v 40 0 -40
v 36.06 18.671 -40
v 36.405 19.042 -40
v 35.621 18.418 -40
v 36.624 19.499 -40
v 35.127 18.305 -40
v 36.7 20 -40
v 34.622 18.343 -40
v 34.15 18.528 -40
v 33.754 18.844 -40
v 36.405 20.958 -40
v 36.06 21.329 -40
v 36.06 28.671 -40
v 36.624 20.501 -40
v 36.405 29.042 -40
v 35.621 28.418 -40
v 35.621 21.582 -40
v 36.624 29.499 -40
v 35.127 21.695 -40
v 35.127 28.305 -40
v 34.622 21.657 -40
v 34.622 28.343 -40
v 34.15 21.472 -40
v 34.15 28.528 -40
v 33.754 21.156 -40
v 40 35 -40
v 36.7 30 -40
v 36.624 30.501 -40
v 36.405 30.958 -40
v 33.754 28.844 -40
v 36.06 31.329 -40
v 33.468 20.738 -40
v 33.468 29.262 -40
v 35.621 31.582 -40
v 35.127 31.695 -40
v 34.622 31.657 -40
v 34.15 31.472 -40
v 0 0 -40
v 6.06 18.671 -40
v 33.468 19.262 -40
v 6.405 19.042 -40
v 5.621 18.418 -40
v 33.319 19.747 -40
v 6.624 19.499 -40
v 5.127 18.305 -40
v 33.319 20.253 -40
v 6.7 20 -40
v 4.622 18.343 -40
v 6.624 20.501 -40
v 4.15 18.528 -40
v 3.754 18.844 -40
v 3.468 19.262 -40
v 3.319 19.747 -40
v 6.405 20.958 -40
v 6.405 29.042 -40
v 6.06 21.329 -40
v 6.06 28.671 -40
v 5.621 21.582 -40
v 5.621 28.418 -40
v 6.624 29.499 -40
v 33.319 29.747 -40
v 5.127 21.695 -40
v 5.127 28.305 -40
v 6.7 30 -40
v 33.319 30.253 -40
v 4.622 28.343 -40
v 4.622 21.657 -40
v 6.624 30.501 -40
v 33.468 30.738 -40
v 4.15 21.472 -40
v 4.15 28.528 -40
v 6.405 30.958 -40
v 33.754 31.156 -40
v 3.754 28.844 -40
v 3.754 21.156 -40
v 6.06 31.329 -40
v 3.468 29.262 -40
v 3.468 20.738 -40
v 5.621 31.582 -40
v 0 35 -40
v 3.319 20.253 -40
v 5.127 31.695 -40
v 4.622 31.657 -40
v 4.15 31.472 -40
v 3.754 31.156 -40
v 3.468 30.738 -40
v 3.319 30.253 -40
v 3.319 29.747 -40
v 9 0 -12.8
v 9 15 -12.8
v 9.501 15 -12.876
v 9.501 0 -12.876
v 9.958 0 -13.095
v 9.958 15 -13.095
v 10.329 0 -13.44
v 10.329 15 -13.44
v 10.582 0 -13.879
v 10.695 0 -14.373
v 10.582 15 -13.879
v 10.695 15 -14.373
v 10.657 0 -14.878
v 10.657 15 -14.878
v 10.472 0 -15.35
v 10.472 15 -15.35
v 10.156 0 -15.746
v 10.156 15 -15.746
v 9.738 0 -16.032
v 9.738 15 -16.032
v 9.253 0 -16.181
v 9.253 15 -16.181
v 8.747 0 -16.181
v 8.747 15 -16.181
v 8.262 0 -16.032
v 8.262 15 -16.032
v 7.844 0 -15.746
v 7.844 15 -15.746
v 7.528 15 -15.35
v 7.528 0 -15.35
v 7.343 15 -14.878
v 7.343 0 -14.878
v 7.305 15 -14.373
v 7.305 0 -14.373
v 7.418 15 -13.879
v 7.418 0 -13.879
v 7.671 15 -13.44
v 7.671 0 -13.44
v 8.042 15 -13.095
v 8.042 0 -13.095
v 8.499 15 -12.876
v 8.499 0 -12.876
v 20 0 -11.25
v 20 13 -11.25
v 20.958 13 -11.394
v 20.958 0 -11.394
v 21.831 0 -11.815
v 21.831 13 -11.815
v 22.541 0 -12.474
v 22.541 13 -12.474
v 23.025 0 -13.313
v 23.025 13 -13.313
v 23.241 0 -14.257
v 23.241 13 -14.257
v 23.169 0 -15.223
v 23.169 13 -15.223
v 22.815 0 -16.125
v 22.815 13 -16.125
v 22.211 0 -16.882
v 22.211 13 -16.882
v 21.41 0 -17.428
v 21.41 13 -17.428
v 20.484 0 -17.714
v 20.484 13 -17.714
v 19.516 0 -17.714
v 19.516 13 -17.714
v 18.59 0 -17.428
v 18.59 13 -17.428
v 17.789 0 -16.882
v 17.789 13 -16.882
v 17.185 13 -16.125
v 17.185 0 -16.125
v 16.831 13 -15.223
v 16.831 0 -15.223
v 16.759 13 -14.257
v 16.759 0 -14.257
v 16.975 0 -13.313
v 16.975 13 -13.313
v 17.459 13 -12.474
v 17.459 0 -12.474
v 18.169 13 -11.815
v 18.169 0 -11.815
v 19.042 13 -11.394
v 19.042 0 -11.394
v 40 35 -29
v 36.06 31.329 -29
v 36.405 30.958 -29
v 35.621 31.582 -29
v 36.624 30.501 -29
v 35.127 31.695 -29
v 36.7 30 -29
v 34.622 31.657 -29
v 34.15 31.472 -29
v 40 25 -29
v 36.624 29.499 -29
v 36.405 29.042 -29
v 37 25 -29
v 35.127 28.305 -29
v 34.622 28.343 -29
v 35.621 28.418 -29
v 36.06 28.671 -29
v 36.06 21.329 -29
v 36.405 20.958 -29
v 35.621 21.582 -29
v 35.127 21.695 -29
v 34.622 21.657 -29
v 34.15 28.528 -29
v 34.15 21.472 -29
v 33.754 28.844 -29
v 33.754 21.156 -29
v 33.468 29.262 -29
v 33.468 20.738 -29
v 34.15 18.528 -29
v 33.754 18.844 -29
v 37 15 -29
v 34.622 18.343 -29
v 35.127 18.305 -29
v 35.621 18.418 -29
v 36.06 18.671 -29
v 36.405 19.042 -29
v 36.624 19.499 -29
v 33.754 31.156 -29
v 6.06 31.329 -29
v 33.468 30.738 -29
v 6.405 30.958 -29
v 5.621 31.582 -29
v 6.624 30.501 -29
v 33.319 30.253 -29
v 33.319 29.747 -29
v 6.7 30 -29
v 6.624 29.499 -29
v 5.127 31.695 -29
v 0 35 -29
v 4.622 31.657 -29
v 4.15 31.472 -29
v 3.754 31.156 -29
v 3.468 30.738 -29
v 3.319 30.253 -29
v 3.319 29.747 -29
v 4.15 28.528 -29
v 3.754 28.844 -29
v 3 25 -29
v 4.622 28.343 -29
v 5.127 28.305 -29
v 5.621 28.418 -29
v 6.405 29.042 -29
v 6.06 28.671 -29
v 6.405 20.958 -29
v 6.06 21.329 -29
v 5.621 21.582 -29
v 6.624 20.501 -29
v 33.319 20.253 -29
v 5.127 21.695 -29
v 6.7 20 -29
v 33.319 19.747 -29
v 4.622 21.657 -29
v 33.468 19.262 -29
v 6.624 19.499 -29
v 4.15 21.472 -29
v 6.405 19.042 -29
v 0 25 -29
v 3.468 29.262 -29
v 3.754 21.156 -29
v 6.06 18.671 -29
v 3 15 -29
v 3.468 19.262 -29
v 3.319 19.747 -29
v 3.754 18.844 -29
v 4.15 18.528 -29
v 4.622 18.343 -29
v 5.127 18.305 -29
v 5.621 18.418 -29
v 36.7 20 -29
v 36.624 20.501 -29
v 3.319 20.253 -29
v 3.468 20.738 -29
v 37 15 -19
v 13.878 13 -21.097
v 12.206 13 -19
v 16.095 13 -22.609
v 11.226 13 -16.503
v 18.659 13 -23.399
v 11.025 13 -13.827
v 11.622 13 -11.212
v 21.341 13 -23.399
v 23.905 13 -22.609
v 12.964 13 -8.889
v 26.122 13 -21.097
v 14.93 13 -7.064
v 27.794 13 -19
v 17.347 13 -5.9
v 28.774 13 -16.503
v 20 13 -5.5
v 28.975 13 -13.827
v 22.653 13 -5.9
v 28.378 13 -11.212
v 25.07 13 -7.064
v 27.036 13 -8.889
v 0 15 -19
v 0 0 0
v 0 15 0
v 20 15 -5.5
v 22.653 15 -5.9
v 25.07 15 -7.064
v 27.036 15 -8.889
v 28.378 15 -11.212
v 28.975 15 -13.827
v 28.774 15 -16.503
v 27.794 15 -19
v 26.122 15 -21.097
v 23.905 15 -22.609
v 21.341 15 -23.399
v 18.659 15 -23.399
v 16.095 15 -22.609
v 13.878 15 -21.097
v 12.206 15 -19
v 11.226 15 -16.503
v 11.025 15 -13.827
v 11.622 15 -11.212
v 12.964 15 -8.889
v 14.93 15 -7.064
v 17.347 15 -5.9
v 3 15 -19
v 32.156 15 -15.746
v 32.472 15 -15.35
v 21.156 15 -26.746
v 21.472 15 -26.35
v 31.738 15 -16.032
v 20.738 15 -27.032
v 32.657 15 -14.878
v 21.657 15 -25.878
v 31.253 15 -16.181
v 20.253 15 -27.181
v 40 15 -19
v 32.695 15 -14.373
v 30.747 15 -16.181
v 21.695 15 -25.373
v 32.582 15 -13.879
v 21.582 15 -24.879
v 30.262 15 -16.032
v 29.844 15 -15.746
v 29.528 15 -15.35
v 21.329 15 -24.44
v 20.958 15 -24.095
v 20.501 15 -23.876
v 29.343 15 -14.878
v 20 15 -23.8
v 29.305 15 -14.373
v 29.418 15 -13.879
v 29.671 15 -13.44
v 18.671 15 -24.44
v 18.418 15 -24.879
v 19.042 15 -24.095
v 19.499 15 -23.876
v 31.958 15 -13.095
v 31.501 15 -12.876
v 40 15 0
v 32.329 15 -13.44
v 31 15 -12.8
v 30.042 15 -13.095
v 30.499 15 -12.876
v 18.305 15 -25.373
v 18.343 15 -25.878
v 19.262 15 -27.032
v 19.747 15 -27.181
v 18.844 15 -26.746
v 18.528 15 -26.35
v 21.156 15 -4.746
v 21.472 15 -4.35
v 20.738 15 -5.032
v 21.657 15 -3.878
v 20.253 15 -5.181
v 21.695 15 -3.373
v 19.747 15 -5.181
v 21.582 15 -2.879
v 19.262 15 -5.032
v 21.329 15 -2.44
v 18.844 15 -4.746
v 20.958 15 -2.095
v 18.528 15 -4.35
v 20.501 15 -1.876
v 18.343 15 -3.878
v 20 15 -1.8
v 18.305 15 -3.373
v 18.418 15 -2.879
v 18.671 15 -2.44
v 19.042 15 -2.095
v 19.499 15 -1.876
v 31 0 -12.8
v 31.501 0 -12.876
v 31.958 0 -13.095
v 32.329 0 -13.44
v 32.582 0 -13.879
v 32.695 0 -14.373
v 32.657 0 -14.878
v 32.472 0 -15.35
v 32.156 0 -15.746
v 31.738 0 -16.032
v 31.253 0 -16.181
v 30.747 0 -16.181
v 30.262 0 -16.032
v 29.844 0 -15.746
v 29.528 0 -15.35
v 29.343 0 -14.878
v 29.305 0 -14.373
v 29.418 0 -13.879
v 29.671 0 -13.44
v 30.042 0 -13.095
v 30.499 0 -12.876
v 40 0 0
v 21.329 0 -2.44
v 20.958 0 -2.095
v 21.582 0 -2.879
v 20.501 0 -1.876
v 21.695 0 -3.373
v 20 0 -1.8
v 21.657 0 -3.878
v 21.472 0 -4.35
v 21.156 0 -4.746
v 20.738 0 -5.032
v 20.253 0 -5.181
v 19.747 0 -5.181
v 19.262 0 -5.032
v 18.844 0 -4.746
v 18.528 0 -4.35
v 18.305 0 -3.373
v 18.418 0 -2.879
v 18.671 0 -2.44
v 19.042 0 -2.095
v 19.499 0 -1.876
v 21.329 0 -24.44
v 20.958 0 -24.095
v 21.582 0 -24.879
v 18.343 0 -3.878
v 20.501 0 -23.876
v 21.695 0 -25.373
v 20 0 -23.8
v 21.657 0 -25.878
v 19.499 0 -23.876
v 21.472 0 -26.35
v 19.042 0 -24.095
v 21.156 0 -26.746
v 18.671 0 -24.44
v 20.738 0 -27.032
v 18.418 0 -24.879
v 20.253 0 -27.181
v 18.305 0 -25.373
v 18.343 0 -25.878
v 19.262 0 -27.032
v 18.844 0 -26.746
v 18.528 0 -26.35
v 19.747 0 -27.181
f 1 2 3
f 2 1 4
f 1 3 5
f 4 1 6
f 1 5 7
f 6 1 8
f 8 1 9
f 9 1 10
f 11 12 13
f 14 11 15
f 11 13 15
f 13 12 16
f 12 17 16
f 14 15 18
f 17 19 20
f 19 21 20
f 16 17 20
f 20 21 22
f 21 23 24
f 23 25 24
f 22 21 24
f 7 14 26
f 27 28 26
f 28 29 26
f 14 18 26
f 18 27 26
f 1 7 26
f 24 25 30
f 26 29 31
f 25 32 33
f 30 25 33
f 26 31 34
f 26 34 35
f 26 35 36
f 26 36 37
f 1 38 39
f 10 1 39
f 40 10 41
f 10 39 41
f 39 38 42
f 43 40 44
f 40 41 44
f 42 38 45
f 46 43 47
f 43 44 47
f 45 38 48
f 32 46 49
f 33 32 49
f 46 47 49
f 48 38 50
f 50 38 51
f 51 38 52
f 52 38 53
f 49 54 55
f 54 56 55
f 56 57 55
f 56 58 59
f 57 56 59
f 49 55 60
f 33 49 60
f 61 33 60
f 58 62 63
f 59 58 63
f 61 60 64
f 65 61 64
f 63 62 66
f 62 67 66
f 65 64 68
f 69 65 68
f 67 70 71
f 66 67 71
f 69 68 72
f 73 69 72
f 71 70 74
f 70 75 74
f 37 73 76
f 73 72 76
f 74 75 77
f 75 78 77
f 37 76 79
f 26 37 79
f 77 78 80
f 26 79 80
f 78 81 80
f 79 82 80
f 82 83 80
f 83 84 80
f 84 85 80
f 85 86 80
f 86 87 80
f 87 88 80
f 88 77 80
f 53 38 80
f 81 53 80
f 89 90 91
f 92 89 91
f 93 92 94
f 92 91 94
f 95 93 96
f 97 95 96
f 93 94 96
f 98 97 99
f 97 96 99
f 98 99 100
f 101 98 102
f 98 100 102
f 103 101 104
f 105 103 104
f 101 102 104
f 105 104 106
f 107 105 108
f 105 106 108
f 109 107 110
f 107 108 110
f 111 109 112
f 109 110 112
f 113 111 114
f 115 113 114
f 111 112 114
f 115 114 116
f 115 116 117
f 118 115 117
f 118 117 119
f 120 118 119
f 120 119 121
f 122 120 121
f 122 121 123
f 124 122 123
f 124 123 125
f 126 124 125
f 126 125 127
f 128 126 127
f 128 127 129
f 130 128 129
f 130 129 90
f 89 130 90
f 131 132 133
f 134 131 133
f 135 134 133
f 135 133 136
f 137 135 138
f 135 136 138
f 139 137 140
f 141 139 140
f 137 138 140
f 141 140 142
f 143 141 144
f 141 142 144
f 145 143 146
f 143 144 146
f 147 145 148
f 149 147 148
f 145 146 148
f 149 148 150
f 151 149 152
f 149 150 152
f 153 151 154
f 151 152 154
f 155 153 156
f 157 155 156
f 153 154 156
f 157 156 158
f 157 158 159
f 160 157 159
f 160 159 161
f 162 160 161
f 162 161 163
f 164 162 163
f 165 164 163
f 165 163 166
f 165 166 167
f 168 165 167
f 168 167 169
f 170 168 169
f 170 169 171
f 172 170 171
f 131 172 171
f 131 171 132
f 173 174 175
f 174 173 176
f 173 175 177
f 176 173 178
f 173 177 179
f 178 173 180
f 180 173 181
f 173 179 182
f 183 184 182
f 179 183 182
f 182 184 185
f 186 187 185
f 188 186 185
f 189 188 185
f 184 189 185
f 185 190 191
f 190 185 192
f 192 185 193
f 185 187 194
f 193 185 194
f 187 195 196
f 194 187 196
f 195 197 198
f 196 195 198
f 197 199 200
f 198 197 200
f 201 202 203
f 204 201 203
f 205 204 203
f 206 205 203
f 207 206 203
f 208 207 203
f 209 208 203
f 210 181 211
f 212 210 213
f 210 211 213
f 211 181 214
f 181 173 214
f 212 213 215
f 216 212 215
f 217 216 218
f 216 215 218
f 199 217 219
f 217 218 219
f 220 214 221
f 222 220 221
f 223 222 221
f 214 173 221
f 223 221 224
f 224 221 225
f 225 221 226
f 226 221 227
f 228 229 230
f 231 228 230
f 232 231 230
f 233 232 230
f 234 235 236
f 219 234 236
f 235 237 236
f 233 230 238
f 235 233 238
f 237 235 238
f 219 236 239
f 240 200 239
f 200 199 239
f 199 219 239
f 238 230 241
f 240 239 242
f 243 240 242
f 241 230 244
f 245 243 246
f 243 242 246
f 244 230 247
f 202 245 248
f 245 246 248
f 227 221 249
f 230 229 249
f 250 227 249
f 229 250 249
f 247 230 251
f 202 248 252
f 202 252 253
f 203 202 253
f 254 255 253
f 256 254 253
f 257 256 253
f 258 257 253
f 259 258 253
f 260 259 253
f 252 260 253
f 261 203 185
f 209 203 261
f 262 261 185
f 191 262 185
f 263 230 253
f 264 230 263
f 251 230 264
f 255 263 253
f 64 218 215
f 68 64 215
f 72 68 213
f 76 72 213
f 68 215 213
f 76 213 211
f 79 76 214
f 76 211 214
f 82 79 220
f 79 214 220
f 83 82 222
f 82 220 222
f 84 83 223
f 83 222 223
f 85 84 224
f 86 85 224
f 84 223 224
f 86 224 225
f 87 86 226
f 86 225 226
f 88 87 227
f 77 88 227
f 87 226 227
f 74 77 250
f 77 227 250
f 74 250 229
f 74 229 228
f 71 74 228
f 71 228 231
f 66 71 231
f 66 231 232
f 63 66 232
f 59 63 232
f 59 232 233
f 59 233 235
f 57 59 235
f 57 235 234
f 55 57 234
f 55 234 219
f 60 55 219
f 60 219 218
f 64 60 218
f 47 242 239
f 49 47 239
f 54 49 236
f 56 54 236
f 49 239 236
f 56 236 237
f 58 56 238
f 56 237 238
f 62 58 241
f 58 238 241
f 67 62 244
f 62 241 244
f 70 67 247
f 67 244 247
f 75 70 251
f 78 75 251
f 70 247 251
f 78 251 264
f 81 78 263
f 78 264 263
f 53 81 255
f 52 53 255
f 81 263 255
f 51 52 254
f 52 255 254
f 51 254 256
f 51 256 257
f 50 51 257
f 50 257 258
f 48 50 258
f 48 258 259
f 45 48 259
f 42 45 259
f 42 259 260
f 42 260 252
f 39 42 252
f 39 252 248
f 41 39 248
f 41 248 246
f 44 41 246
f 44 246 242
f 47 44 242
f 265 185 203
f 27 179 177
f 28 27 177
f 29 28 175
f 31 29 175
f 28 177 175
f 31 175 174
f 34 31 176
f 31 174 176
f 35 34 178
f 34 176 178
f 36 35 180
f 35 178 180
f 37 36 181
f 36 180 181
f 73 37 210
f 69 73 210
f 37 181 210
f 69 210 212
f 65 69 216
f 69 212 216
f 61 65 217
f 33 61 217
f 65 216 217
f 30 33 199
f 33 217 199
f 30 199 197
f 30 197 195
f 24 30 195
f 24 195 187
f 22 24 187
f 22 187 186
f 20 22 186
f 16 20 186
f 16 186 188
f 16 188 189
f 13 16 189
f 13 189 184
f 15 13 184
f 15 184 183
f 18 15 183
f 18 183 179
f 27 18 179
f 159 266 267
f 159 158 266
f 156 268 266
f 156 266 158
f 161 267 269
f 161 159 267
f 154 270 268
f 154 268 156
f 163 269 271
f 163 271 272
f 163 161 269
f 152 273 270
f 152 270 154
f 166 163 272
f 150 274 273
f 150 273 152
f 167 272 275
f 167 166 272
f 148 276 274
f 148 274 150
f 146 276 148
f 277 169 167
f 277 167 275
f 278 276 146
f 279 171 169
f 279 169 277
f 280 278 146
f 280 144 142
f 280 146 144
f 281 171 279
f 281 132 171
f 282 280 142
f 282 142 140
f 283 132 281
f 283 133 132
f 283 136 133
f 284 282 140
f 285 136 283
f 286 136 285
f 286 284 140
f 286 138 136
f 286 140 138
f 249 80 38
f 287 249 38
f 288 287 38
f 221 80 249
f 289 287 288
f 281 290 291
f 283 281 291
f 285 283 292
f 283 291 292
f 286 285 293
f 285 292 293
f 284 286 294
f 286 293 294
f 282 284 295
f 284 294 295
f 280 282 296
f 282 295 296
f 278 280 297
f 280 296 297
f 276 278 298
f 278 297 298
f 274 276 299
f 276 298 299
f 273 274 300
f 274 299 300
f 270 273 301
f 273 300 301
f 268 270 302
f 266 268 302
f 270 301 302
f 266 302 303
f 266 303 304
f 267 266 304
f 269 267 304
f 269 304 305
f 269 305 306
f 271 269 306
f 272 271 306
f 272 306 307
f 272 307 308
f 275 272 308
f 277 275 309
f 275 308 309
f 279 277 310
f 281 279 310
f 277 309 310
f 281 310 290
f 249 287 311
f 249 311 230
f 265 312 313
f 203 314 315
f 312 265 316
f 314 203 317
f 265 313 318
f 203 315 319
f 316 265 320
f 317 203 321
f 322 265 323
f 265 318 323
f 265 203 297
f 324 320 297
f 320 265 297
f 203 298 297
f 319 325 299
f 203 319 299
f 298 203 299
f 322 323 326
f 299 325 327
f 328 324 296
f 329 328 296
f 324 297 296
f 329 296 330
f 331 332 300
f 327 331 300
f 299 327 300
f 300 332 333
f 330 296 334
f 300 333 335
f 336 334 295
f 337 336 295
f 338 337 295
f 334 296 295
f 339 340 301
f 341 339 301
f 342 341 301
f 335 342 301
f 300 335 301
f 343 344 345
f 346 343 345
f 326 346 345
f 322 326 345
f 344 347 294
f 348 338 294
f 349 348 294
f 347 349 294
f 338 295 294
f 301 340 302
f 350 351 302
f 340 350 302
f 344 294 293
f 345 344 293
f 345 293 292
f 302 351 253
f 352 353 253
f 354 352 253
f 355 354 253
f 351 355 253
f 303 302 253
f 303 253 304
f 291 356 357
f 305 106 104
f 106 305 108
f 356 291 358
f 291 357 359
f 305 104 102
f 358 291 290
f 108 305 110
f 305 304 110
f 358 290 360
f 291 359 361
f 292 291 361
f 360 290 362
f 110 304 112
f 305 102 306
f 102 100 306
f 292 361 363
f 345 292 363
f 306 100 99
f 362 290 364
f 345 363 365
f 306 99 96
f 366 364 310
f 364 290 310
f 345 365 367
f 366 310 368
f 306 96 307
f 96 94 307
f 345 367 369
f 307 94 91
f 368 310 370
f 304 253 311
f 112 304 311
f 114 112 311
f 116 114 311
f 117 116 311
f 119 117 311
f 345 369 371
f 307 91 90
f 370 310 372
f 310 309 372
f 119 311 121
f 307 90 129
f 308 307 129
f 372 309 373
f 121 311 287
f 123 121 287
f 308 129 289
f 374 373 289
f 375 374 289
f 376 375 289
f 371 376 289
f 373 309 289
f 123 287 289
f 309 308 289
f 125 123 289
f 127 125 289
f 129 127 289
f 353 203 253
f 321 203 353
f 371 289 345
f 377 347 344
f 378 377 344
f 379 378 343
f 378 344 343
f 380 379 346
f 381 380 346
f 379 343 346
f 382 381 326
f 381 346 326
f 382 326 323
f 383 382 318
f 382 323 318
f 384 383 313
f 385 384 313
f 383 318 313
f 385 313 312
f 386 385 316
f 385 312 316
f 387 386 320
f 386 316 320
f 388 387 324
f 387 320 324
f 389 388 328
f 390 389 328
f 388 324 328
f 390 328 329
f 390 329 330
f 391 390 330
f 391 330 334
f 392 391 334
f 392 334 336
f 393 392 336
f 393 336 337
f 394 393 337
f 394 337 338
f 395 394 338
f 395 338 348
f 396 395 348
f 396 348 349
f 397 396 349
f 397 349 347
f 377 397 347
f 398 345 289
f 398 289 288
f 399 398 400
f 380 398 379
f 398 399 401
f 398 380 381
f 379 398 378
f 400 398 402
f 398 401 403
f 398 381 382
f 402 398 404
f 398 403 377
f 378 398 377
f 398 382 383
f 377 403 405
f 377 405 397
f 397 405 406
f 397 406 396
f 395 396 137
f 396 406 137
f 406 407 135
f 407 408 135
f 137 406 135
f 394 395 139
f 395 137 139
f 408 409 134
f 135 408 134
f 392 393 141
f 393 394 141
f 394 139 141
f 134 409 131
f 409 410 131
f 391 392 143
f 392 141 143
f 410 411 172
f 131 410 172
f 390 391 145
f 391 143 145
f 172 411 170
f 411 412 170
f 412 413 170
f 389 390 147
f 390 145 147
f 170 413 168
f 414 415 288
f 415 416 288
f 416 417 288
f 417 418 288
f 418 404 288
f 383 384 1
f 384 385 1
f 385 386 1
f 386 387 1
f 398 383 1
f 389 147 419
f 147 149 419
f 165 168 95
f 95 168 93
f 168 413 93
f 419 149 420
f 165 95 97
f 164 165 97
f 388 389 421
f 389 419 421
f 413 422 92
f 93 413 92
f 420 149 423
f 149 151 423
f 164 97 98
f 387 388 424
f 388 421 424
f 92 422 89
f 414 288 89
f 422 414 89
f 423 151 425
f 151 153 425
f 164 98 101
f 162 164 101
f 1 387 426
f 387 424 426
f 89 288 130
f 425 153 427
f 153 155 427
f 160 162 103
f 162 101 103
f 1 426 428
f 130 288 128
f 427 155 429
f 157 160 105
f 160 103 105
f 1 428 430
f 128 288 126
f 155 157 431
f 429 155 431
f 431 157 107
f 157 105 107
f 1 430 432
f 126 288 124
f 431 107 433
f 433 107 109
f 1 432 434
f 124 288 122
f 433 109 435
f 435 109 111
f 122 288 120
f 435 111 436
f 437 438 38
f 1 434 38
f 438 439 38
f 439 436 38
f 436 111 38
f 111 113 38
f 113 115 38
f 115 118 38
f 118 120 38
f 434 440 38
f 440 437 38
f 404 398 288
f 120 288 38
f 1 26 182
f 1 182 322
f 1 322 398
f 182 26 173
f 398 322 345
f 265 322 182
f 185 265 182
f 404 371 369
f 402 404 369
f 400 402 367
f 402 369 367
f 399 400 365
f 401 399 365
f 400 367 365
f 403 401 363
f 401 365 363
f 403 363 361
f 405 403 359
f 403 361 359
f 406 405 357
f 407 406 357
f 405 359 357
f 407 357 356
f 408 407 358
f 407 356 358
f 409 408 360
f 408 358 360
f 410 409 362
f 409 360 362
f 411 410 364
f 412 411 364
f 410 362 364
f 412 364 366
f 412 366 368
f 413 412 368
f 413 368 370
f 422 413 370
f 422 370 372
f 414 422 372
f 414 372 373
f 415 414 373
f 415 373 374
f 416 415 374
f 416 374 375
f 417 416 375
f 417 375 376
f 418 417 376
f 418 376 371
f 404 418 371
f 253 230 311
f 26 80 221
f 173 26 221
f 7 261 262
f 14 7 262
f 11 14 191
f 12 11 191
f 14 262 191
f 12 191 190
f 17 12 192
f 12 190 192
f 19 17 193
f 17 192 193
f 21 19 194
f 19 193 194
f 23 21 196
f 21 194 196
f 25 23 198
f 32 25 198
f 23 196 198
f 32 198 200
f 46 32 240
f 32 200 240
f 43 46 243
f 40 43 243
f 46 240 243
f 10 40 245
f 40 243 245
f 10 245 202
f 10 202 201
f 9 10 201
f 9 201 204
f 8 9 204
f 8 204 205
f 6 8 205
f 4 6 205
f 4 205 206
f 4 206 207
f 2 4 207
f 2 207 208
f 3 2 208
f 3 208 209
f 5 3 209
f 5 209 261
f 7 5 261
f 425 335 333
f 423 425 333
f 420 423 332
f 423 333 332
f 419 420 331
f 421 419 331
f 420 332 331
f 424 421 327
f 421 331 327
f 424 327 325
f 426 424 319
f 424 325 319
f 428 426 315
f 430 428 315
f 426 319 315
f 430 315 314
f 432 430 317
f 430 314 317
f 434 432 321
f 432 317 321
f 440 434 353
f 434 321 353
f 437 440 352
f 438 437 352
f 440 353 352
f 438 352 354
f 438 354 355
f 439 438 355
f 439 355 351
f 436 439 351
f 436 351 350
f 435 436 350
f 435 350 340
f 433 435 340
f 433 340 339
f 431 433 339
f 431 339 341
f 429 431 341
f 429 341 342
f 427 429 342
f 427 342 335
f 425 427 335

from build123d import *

# Parameters (mm, degrees)
BOSS_EXTRUDE1_DEPTH = 40
SKETCH2_R           = 9
CUT_EXTRUDE8_DEPTH  = 2
SKETCH6_R           = 3.25
CUT_EXTRUDE9_DEPTH  = 61.695963622
SKETCH7_R           = 1.7
CUT_EXTRUDE10_DEPTH = 61
SKETCH8_R           = 1.7
CUT_EXTRUDE11_DEPTH = 61.547502013
BOSS_EXTRUDE3_DEPTH = 3


with BuildPart() as part:
    # Sketch1 → Boss-Extrude1 (new body)
    with BuildSketch(Plane(origin=(0, 0, 0), x_dir=(0, 0, -1), z_dir=(1, 0, 0))):
        Polygon((0, 0), (40, 0), (40, 15), (40, 35), (29, 35), (29, 15), (0, 15), align=None)
    extrude(amount=BOSS_EXTRUDE1_DEPTH)

    # Sketch2 → Cut-Extrude8 (cut)
    with BuildSketch(Plane(origin=(0, 15, 0), x_dir=(1, 0, 0), z_dir=(0, 1, 0))):
        with Locations(Location((20, 14.5, 0), (0, 0, 270))):
            Circle(SKETCH2_R)
    extrude(amount=-CUT_EXTRUDE8_DEPTH, mode=Mode.SUBTRACT)

    # Sketch6 → Cut-Extrude9 (cut, through all)
    with BuildSketch(Plane(origin=(0, 13, 0), x_dir=(1, 0, 0), z_dir=(0, 1, 0))):
        with Locations(Location((20, 14.5, 0), (0, 0, 270))):
            Circle(SKETCH6_R)
    extrude(amount=-CUT_EXTRUDE9_DEPTH, mode=Mode.SUBTRACT)

    # Sketch7 → Cut-Extrude10 (cut, through all)
    with BuildSketch(Plane(origin=(0, 15, 0), x_dir=(1, 0, 0), z_dir=(0, 1, 0))):
        with Locations(Location((31, 14.5, 0), (0, 0, 270))):
            Circle(SKETCH7_R)
        with Locations(Location((20, 25.5, 0), (0, 0, 270))):
            Circle(SKETCH7_R)
        with Locations(Location((9, 14.5, 0), (0, 0, 270))):
            Circle(SKETCH7_R)
        with Locations(Location((20, 3.5, 0), (0, 0, 270))):
            Circle(SKETCH7_R)
    extrude(amount=-CUT_EXTRUDE10_DEPTH, mode=Mode.SUBTRACT)

    # Sketch8 → Cut-Extrude11 (cut, through all)
    with BuildSketch(Plane.XY.offset(-29)):
        with Locations((35, 30)):
            Circle(SKETCH8_R)
        with Locations((35, 20)):
            Circle(SKETCH8_R)
        with Locations((5, 30)):
            Circle(SKETCH8_R)
        with Locations((5, 20)):
            Circle(SKETCH8_R)
    extrude(amount=-CUT_EXTRUDE11_DEPTH, mode=Mode.SUBTRACT)

    # Sketch9 → Boss-Extrude3 (add)
    with BuildSketch(Plane(origin=(40, 0, 0), x_dir=(0, 0, -1), z_dir=(1, 0, 0))):
        Polygon((29, 25), (29, 15), (19, 15), align=None)
    boss_extrude3 = extrude(amount=-BOSS_EXTRUDE3_DEPTH)

    # Mirror3: Boss-Extrude3 across plane
    add(boss_extrude3.mirror(Plane.ZY.offset(-20)))


solid = part.part
